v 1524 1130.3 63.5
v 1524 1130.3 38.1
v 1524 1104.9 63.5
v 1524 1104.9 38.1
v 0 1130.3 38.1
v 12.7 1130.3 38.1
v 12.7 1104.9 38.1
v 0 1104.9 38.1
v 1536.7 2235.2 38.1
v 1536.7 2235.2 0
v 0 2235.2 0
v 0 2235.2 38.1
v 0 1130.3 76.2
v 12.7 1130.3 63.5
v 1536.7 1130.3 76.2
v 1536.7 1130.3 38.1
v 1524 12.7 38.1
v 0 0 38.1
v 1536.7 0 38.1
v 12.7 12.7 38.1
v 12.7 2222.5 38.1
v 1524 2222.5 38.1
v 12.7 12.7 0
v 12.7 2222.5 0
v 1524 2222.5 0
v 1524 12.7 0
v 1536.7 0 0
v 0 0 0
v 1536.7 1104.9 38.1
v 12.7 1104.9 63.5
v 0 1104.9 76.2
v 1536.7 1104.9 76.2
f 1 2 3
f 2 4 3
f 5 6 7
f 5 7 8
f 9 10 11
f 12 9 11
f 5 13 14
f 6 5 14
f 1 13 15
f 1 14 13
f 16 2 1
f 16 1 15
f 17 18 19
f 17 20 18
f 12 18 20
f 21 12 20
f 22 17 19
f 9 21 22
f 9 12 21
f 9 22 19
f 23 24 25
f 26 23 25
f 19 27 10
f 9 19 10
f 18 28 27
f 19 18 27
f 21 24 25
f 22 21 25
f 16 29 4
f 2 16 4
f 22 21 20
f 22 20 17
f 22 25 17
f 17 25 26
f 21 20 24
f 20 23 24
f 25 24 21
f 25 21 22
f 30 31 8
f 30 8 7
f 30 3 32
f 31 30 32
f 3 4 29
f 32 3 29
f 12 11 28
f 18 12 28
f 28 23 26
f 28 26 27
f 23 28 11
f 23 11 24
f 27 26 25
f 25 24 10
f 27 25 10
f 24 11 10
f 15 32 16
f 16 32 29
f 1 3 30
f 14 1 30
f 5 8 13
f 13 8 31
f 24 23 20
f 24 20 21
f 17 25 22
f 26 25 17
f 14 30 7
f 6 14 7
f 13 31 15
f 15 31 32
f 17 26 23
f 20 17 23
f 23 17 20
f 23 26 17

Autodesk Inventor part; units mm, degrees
ref_plane "YZ Plane" through (0, 0, 0) normal (1, 0, 0) x (0, 1, 0)
sketch "Sketch1" plane through (0, 0, 0) normal (0, 0, 1) x (1, 0, 0)
  line L0 (0, 0) -> (1536.7, 0)
  line L1 (1536.7, 0) -> (1536.7, 2235.2)
  line L2 (1536.7, 2235.2) -> (0, 2235.2)
  line L3 (0, 2235.2) -> (0, 0)
  line L4 (12.7, 2222.5) -> (1524, 2222.5)
  line L5 (1524, 2222.5) -> (1524, 12.7)
  line L6 (1524, 12.7) -> (12.7, 12.7)
  line L7 (12.7, 12.7) -> (12.7, 2222.5)
  dimension "d2" = 2235.2
  dimension "d3" = 1536.7
  dimension "d4" = 12.7
extrude "GlassPane" add sketch "Sketch1" along normal blind 38.1 contours L4 L5 L6 L7
extrude "Frame" add sketch "Sketch1" along normal blind 38.1 separate body
ref_plane "Work Plane1" through (0, 1117.6, 0) normal (0, 1, 0) x (1, 0, 0)
ref_plane "Work Plane2" through (0, 0, 19.05) normal (0, 0, 1) x (1, 0, 0)
sketch "Sketch2" plane through (0, 1117.6, 0) normal (0, 1, 0) x (1, 0, 0)
  line L0 (12.7, -38.1) -> (0, -38.1)
  line L1 (0, -38.1) -> (0, -76.2)
  line L2 (0, -76.2) -> (1536.7, -76.2)
  line L3 (1536.7, -76.2) -> (1536.7, -38.1)
  line L4 (1536.7, -38.1) -> (1524, -38.1)
  line L5 (1524, -38.1) -> (1524, -63.5)
  line L6 (1524, -63.5) -> (12.7, -63.5)
  line L7 (12.7, -63.5) -> (12.7, -38.1)
  dimension "d7" = 12.7
  dimension "d8" = 12.7
  dimension "d9" = 38.1
extrude "Handle" add sketch "Sketch2" along normal mid plane 25.4 separate body
mirror "MirrorExterior" [suppressed]
equation "\"d2\" = Height - FrameWidth"
equation "\"d0\" = 0.375 * Depth"
equation "\"d5\" = 0.375 * Depth"
equation "\"d8\" = d7"
equation "\"Width\" = 3048"
equation "\"Height\" = 2286"
equation "\"Depth\" = 101.6"
equation "\"FrameWidth\" = 50.8"
properties part number "SlidingDoorPanel"
